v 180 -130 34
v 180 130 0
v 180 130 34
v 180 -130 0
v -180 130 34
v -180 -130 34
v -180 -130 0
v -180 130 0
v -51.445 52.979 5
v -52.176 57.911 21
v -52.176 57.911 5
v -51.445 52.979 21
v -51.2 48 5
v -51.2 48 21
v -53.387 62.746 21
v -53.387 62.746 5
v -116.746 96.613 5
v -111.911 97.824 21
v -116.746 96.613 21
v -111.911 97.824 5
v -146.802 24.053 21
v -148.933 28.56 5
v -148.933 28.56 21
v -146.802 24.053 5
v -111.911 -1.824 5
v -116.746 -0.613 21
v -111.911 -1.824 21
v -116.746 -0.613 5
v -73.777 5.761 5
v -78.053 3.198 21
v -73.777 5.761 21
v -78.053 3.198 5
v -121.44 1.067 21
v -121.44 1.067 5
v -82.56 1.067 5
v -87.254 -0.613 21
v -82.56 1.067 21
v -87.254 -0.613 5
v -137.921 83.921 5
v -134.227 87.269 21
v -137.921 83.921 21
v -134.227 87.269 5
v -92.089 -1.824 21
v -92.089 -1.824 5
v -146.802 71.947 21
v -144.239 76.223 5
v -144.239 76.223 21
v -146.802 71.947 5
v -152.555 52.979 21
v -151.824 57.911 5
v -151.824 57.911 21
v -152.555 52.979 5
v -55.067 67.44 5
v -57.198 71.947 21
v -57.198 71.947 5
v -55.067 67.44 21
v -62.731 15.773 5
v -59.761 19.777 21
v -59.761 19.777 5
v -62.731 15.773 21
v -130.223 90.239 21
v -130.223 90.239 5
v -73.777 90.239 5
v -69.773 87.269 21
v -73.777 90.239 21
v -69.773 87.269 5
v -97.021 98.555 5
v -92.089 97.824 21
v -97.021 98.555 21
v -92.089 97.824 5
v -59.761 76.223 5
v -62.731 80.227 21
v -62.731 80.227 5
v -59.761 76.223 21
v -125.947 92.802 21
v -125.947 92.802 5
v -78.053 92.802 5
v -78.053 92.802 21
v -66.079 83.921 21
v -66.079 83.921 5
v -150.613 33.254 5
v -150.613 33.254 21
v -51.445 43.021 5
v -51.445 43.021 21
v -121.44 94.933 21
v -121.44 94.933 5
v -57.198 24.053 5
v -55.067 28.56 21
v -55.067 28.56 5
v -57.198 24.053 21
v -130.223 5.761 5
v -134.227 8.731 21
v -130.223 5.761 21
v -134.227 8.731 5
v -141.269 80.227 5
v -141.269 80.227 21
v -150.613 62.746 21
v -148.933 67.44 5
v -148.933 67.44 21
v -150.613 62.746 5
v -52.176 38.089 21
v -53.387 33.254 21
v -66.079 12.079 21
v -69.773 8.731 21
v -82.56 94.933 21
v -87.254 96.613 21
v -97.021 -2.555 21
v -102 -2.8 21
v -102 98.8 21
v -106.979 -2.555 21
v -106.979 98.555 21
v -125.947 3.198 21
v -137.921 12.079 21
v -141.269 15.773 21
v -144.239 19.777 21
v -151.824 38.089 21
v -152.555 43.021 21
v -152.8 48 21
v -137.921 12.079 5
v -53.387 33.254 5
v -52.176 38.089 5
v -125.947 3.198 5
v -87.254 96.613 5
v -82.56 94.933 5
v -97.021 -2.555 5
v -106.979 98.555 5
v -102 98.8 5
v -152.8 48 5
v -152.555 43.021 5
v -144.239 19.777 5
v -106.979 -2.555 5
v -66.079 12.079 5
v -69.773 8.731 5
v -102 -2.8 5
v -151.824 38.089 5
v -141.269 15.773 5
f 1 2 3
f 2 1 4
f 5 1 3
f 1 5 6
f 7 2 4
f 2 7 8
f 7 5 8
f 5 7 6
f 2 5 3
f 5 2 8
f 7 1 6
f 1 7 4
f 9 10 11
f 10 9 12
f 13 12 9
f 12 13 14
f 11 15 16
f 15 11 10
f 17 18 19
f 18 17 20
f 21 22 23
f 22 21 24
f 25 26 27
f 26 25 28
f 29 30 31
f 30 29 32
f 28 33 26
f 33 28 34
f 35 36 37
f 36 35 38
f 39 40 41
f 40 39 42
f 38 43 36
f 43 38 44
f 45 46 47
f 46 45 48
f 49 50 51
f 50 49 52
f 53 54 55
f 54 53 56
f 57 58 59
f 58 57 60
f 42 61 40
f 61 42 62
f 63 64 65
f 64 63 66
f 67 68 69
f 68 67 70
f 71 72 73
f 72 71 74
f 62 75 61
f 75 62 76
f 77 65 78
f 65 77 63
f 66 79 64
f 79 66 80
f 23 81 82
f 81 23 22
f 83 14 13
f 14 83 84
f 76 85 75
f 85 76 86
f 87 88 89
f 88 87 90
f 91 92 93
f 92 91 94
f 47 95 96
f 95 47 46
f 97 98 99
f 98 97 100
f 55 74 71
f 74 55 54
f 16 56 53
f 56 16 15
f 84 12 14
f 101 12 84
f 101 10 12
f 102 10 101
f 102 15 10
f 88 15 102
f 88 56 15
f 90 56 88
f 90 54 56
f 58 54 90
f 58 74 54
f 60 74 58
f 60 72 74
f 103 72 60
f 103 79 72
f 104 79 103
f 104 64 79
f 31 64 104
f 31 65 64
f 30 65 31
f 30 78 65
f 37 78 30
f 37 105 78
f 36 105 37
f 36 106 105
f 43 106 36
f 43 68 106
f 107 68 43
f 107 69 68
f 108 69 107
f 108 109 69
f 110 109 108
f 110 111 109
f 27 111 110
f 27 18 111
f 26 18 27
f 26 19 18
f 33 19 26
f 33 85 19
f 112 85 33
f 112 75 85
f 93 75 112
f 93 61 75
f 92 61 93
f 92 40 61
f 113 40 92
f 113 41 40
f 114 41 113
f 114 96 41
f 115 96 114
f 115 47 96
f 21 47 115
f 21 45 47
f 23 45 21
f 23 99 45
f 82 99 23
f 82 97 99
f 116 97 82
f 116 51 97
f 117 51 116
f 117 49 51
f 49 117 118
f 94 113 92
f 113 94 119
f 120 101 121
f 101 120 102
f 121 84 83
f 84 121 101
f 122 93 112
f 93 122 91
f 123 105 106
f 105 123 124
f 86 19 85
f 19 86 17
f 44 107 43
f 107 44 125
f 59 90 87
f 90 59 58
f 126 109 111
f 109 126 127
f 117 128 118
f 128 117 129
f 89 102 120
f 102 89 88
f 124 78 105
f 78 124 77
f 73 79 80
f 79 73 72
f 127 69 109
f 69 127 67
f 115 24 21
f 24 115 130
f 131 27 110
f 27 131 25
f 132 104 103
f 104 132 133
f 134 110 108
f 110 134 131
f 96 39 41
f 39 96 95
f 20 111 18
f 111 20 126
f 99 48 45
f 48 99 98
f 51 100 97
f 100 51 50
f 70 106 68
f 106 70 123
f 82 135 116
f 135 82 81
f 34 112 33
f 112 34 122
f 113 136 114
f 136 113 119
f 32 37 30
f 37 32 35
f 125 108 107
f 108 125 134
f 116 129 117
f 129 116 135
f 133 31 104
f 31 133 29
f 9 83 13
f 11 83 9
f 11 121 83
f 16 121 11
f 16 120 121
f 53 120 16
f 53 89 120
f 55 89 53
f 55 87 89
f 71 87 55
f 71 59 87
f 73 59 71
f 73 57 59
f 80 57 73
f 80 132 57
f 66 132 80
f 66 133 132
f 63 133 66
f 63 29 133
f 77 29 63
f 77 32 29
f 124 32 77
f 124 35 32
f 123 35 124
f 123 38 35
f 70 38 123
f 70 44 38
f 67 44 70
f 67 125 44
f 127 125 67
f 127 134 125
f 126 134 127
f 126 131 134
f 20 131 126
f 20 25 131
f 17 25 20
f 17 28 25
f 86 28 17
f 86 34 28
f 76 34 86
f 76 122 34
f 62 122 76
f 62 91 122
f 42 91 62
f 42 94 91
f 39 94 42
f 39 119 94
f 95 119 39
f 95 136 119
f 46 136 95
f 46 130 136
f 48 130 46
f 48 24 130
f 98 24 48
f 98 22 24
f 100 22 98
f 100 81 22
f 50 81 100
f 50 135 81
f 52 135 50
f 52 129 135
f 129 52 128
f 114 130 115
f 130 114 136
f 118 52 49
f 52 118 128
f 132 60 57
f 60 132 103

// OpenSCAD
// ============================================================================
// Atom Lithography Machine — Parametric OpenSCAD Module (S5.1-05)
// ============================================================================
// part_id           : S5.1-05
// parent_bom_id     : S5.1
// subsystem         : S5
// part_name         : UHV tam-metal aci vanalari, gozlem pencereleri ve CF baglanti seti
// material          : OFHC Cu
// temp_stage        : 300 K
// vacuum_grade      : UHV 1e-9 mbar
// tolerance         : He <=1e-10 mbar*L/s
// computed_mass_kg  : 8.48547
// envelope_mm       : 385.000 x 260.000 x 87.000
// design_maturity   : M0_M1_DETAILED_CAD_DESIGN_ONLY
// no_lab_measurement: true
// iec61508_certified: false
// semi_s2_certified : false
// Units: millimeters (mm)
// ============================================================================

$fn = 64;

// Nominal bounding envelope parameters (mm)
bbox_x = 385.0000;
bbox_y = 260.0000;
bbox_z = 87.0000;

// Part-specific parametric dimensions
tray_x = 360.0;
tray_y = 260.0;
cf100_gask_od = 120.5;
cf63_gask_od = 82.4;

// Interface / port parameters (mm)
port_gasket_cf100_spec_od = 152.000;
port_gasket_cf100_spec_bore = 101.600;
port_gasket_cf100_spec_pcd = 130.200;
port_gasket_cf100_spec_bolts = 16;
port_gasket_cf63_spec_od = 113.500;
port_gasket_cf63_spec_bore = 63.500;
port_gasket_cf63_spec_pcd = 92.100;
port_gasket_cf63_spec_bolts = 8;
port_angle_valve_cf40_od = 69.500;
port_angle_valve_cf40_bore = 38.000;
port_angle_valve_cf40_pcd = 58.700;
port_angle_valve_cf40_bolts = 6;

module part_S5_1_05() {
  difference() {
    union() {
      // UHV CF hardware & gasket kit tray
      translate([0.000, 0.000, 17.000]) cube([360.000, 260.000, 34.000], center=true);
      // OFHC Cu CF100 gasket stack
      translate([-102.000, 48.000, 13.000]) {
        difference() {
          cylinder(d=120.500, h=12.000, center=true);
          cylinder(d=101.600, h=14.000, center=true);
        }
      }
      // OFHC Cu CF63 gasket stack
      translate([18.000, 62.000, 13.000]) {
        difference() {
          cylinder(d=82.400, h=12.000, center=true);
          cylinder(d=63.500, h=14.000, center=true);
        }
      }
      // OFHC Cu CF40 gasket stack
      translate([118.000, 72.000, 14.000]) {
        difference() {
          cylinder(d=48.100, h=14.000, center=true);
          cylinder(d=38.000, h=16.000, center=true);
        }
      }
      // All-metal bakeable CF40 angle valve #1
      translate([25.000, -66.000, 14.000]) {
        difference() {
          cylinder(d=69.500, h=12.700, center=true);
          cylinder(d=38.000, h=14.700, center=true);
          translate([0, 0, 5.100]) cylinder(d=48.100, h=1.750);
          for (i = [0 : 6 - 1])
            rotate([0, 0, i * 360 / 6])
              translate([29.350, 0, 0])
                cylinder(d=6.600, h=14.700, center=true);
        }
      }
      // All-metal bakeable CF40 angle valve #2
      translate([118.000, -66.000, 14.000]) {
        difference() {
          cylinder(d=69.500, h=12.700, center=true);
          cylinder(d=38.000, h=14.700, center=true);
          translate([0, 0, 5.100]) cylinder(d=48.100, h=1.750);
          for (i = [0 : 6 - 1])
            rotate([0, 0, i * 360 / 6])
              translate([29.350, 0, 0])
                cylinder(d=6.600, h=14.700, center=true);
        }
      }
    }
    // CF100 gasket ID bore
    translate([-102.000, 48.000, 13.000]) cylinder(d=101.600, h=16.000, center=true);
  }
}

// World assembly mounting transform (global machine frame, mm / deg):
// translate([780.000, -480.000, 0.000]) rotate([0.000, 0.000, 0.000]) part_S5_1_05();

part_S5_1_05();
